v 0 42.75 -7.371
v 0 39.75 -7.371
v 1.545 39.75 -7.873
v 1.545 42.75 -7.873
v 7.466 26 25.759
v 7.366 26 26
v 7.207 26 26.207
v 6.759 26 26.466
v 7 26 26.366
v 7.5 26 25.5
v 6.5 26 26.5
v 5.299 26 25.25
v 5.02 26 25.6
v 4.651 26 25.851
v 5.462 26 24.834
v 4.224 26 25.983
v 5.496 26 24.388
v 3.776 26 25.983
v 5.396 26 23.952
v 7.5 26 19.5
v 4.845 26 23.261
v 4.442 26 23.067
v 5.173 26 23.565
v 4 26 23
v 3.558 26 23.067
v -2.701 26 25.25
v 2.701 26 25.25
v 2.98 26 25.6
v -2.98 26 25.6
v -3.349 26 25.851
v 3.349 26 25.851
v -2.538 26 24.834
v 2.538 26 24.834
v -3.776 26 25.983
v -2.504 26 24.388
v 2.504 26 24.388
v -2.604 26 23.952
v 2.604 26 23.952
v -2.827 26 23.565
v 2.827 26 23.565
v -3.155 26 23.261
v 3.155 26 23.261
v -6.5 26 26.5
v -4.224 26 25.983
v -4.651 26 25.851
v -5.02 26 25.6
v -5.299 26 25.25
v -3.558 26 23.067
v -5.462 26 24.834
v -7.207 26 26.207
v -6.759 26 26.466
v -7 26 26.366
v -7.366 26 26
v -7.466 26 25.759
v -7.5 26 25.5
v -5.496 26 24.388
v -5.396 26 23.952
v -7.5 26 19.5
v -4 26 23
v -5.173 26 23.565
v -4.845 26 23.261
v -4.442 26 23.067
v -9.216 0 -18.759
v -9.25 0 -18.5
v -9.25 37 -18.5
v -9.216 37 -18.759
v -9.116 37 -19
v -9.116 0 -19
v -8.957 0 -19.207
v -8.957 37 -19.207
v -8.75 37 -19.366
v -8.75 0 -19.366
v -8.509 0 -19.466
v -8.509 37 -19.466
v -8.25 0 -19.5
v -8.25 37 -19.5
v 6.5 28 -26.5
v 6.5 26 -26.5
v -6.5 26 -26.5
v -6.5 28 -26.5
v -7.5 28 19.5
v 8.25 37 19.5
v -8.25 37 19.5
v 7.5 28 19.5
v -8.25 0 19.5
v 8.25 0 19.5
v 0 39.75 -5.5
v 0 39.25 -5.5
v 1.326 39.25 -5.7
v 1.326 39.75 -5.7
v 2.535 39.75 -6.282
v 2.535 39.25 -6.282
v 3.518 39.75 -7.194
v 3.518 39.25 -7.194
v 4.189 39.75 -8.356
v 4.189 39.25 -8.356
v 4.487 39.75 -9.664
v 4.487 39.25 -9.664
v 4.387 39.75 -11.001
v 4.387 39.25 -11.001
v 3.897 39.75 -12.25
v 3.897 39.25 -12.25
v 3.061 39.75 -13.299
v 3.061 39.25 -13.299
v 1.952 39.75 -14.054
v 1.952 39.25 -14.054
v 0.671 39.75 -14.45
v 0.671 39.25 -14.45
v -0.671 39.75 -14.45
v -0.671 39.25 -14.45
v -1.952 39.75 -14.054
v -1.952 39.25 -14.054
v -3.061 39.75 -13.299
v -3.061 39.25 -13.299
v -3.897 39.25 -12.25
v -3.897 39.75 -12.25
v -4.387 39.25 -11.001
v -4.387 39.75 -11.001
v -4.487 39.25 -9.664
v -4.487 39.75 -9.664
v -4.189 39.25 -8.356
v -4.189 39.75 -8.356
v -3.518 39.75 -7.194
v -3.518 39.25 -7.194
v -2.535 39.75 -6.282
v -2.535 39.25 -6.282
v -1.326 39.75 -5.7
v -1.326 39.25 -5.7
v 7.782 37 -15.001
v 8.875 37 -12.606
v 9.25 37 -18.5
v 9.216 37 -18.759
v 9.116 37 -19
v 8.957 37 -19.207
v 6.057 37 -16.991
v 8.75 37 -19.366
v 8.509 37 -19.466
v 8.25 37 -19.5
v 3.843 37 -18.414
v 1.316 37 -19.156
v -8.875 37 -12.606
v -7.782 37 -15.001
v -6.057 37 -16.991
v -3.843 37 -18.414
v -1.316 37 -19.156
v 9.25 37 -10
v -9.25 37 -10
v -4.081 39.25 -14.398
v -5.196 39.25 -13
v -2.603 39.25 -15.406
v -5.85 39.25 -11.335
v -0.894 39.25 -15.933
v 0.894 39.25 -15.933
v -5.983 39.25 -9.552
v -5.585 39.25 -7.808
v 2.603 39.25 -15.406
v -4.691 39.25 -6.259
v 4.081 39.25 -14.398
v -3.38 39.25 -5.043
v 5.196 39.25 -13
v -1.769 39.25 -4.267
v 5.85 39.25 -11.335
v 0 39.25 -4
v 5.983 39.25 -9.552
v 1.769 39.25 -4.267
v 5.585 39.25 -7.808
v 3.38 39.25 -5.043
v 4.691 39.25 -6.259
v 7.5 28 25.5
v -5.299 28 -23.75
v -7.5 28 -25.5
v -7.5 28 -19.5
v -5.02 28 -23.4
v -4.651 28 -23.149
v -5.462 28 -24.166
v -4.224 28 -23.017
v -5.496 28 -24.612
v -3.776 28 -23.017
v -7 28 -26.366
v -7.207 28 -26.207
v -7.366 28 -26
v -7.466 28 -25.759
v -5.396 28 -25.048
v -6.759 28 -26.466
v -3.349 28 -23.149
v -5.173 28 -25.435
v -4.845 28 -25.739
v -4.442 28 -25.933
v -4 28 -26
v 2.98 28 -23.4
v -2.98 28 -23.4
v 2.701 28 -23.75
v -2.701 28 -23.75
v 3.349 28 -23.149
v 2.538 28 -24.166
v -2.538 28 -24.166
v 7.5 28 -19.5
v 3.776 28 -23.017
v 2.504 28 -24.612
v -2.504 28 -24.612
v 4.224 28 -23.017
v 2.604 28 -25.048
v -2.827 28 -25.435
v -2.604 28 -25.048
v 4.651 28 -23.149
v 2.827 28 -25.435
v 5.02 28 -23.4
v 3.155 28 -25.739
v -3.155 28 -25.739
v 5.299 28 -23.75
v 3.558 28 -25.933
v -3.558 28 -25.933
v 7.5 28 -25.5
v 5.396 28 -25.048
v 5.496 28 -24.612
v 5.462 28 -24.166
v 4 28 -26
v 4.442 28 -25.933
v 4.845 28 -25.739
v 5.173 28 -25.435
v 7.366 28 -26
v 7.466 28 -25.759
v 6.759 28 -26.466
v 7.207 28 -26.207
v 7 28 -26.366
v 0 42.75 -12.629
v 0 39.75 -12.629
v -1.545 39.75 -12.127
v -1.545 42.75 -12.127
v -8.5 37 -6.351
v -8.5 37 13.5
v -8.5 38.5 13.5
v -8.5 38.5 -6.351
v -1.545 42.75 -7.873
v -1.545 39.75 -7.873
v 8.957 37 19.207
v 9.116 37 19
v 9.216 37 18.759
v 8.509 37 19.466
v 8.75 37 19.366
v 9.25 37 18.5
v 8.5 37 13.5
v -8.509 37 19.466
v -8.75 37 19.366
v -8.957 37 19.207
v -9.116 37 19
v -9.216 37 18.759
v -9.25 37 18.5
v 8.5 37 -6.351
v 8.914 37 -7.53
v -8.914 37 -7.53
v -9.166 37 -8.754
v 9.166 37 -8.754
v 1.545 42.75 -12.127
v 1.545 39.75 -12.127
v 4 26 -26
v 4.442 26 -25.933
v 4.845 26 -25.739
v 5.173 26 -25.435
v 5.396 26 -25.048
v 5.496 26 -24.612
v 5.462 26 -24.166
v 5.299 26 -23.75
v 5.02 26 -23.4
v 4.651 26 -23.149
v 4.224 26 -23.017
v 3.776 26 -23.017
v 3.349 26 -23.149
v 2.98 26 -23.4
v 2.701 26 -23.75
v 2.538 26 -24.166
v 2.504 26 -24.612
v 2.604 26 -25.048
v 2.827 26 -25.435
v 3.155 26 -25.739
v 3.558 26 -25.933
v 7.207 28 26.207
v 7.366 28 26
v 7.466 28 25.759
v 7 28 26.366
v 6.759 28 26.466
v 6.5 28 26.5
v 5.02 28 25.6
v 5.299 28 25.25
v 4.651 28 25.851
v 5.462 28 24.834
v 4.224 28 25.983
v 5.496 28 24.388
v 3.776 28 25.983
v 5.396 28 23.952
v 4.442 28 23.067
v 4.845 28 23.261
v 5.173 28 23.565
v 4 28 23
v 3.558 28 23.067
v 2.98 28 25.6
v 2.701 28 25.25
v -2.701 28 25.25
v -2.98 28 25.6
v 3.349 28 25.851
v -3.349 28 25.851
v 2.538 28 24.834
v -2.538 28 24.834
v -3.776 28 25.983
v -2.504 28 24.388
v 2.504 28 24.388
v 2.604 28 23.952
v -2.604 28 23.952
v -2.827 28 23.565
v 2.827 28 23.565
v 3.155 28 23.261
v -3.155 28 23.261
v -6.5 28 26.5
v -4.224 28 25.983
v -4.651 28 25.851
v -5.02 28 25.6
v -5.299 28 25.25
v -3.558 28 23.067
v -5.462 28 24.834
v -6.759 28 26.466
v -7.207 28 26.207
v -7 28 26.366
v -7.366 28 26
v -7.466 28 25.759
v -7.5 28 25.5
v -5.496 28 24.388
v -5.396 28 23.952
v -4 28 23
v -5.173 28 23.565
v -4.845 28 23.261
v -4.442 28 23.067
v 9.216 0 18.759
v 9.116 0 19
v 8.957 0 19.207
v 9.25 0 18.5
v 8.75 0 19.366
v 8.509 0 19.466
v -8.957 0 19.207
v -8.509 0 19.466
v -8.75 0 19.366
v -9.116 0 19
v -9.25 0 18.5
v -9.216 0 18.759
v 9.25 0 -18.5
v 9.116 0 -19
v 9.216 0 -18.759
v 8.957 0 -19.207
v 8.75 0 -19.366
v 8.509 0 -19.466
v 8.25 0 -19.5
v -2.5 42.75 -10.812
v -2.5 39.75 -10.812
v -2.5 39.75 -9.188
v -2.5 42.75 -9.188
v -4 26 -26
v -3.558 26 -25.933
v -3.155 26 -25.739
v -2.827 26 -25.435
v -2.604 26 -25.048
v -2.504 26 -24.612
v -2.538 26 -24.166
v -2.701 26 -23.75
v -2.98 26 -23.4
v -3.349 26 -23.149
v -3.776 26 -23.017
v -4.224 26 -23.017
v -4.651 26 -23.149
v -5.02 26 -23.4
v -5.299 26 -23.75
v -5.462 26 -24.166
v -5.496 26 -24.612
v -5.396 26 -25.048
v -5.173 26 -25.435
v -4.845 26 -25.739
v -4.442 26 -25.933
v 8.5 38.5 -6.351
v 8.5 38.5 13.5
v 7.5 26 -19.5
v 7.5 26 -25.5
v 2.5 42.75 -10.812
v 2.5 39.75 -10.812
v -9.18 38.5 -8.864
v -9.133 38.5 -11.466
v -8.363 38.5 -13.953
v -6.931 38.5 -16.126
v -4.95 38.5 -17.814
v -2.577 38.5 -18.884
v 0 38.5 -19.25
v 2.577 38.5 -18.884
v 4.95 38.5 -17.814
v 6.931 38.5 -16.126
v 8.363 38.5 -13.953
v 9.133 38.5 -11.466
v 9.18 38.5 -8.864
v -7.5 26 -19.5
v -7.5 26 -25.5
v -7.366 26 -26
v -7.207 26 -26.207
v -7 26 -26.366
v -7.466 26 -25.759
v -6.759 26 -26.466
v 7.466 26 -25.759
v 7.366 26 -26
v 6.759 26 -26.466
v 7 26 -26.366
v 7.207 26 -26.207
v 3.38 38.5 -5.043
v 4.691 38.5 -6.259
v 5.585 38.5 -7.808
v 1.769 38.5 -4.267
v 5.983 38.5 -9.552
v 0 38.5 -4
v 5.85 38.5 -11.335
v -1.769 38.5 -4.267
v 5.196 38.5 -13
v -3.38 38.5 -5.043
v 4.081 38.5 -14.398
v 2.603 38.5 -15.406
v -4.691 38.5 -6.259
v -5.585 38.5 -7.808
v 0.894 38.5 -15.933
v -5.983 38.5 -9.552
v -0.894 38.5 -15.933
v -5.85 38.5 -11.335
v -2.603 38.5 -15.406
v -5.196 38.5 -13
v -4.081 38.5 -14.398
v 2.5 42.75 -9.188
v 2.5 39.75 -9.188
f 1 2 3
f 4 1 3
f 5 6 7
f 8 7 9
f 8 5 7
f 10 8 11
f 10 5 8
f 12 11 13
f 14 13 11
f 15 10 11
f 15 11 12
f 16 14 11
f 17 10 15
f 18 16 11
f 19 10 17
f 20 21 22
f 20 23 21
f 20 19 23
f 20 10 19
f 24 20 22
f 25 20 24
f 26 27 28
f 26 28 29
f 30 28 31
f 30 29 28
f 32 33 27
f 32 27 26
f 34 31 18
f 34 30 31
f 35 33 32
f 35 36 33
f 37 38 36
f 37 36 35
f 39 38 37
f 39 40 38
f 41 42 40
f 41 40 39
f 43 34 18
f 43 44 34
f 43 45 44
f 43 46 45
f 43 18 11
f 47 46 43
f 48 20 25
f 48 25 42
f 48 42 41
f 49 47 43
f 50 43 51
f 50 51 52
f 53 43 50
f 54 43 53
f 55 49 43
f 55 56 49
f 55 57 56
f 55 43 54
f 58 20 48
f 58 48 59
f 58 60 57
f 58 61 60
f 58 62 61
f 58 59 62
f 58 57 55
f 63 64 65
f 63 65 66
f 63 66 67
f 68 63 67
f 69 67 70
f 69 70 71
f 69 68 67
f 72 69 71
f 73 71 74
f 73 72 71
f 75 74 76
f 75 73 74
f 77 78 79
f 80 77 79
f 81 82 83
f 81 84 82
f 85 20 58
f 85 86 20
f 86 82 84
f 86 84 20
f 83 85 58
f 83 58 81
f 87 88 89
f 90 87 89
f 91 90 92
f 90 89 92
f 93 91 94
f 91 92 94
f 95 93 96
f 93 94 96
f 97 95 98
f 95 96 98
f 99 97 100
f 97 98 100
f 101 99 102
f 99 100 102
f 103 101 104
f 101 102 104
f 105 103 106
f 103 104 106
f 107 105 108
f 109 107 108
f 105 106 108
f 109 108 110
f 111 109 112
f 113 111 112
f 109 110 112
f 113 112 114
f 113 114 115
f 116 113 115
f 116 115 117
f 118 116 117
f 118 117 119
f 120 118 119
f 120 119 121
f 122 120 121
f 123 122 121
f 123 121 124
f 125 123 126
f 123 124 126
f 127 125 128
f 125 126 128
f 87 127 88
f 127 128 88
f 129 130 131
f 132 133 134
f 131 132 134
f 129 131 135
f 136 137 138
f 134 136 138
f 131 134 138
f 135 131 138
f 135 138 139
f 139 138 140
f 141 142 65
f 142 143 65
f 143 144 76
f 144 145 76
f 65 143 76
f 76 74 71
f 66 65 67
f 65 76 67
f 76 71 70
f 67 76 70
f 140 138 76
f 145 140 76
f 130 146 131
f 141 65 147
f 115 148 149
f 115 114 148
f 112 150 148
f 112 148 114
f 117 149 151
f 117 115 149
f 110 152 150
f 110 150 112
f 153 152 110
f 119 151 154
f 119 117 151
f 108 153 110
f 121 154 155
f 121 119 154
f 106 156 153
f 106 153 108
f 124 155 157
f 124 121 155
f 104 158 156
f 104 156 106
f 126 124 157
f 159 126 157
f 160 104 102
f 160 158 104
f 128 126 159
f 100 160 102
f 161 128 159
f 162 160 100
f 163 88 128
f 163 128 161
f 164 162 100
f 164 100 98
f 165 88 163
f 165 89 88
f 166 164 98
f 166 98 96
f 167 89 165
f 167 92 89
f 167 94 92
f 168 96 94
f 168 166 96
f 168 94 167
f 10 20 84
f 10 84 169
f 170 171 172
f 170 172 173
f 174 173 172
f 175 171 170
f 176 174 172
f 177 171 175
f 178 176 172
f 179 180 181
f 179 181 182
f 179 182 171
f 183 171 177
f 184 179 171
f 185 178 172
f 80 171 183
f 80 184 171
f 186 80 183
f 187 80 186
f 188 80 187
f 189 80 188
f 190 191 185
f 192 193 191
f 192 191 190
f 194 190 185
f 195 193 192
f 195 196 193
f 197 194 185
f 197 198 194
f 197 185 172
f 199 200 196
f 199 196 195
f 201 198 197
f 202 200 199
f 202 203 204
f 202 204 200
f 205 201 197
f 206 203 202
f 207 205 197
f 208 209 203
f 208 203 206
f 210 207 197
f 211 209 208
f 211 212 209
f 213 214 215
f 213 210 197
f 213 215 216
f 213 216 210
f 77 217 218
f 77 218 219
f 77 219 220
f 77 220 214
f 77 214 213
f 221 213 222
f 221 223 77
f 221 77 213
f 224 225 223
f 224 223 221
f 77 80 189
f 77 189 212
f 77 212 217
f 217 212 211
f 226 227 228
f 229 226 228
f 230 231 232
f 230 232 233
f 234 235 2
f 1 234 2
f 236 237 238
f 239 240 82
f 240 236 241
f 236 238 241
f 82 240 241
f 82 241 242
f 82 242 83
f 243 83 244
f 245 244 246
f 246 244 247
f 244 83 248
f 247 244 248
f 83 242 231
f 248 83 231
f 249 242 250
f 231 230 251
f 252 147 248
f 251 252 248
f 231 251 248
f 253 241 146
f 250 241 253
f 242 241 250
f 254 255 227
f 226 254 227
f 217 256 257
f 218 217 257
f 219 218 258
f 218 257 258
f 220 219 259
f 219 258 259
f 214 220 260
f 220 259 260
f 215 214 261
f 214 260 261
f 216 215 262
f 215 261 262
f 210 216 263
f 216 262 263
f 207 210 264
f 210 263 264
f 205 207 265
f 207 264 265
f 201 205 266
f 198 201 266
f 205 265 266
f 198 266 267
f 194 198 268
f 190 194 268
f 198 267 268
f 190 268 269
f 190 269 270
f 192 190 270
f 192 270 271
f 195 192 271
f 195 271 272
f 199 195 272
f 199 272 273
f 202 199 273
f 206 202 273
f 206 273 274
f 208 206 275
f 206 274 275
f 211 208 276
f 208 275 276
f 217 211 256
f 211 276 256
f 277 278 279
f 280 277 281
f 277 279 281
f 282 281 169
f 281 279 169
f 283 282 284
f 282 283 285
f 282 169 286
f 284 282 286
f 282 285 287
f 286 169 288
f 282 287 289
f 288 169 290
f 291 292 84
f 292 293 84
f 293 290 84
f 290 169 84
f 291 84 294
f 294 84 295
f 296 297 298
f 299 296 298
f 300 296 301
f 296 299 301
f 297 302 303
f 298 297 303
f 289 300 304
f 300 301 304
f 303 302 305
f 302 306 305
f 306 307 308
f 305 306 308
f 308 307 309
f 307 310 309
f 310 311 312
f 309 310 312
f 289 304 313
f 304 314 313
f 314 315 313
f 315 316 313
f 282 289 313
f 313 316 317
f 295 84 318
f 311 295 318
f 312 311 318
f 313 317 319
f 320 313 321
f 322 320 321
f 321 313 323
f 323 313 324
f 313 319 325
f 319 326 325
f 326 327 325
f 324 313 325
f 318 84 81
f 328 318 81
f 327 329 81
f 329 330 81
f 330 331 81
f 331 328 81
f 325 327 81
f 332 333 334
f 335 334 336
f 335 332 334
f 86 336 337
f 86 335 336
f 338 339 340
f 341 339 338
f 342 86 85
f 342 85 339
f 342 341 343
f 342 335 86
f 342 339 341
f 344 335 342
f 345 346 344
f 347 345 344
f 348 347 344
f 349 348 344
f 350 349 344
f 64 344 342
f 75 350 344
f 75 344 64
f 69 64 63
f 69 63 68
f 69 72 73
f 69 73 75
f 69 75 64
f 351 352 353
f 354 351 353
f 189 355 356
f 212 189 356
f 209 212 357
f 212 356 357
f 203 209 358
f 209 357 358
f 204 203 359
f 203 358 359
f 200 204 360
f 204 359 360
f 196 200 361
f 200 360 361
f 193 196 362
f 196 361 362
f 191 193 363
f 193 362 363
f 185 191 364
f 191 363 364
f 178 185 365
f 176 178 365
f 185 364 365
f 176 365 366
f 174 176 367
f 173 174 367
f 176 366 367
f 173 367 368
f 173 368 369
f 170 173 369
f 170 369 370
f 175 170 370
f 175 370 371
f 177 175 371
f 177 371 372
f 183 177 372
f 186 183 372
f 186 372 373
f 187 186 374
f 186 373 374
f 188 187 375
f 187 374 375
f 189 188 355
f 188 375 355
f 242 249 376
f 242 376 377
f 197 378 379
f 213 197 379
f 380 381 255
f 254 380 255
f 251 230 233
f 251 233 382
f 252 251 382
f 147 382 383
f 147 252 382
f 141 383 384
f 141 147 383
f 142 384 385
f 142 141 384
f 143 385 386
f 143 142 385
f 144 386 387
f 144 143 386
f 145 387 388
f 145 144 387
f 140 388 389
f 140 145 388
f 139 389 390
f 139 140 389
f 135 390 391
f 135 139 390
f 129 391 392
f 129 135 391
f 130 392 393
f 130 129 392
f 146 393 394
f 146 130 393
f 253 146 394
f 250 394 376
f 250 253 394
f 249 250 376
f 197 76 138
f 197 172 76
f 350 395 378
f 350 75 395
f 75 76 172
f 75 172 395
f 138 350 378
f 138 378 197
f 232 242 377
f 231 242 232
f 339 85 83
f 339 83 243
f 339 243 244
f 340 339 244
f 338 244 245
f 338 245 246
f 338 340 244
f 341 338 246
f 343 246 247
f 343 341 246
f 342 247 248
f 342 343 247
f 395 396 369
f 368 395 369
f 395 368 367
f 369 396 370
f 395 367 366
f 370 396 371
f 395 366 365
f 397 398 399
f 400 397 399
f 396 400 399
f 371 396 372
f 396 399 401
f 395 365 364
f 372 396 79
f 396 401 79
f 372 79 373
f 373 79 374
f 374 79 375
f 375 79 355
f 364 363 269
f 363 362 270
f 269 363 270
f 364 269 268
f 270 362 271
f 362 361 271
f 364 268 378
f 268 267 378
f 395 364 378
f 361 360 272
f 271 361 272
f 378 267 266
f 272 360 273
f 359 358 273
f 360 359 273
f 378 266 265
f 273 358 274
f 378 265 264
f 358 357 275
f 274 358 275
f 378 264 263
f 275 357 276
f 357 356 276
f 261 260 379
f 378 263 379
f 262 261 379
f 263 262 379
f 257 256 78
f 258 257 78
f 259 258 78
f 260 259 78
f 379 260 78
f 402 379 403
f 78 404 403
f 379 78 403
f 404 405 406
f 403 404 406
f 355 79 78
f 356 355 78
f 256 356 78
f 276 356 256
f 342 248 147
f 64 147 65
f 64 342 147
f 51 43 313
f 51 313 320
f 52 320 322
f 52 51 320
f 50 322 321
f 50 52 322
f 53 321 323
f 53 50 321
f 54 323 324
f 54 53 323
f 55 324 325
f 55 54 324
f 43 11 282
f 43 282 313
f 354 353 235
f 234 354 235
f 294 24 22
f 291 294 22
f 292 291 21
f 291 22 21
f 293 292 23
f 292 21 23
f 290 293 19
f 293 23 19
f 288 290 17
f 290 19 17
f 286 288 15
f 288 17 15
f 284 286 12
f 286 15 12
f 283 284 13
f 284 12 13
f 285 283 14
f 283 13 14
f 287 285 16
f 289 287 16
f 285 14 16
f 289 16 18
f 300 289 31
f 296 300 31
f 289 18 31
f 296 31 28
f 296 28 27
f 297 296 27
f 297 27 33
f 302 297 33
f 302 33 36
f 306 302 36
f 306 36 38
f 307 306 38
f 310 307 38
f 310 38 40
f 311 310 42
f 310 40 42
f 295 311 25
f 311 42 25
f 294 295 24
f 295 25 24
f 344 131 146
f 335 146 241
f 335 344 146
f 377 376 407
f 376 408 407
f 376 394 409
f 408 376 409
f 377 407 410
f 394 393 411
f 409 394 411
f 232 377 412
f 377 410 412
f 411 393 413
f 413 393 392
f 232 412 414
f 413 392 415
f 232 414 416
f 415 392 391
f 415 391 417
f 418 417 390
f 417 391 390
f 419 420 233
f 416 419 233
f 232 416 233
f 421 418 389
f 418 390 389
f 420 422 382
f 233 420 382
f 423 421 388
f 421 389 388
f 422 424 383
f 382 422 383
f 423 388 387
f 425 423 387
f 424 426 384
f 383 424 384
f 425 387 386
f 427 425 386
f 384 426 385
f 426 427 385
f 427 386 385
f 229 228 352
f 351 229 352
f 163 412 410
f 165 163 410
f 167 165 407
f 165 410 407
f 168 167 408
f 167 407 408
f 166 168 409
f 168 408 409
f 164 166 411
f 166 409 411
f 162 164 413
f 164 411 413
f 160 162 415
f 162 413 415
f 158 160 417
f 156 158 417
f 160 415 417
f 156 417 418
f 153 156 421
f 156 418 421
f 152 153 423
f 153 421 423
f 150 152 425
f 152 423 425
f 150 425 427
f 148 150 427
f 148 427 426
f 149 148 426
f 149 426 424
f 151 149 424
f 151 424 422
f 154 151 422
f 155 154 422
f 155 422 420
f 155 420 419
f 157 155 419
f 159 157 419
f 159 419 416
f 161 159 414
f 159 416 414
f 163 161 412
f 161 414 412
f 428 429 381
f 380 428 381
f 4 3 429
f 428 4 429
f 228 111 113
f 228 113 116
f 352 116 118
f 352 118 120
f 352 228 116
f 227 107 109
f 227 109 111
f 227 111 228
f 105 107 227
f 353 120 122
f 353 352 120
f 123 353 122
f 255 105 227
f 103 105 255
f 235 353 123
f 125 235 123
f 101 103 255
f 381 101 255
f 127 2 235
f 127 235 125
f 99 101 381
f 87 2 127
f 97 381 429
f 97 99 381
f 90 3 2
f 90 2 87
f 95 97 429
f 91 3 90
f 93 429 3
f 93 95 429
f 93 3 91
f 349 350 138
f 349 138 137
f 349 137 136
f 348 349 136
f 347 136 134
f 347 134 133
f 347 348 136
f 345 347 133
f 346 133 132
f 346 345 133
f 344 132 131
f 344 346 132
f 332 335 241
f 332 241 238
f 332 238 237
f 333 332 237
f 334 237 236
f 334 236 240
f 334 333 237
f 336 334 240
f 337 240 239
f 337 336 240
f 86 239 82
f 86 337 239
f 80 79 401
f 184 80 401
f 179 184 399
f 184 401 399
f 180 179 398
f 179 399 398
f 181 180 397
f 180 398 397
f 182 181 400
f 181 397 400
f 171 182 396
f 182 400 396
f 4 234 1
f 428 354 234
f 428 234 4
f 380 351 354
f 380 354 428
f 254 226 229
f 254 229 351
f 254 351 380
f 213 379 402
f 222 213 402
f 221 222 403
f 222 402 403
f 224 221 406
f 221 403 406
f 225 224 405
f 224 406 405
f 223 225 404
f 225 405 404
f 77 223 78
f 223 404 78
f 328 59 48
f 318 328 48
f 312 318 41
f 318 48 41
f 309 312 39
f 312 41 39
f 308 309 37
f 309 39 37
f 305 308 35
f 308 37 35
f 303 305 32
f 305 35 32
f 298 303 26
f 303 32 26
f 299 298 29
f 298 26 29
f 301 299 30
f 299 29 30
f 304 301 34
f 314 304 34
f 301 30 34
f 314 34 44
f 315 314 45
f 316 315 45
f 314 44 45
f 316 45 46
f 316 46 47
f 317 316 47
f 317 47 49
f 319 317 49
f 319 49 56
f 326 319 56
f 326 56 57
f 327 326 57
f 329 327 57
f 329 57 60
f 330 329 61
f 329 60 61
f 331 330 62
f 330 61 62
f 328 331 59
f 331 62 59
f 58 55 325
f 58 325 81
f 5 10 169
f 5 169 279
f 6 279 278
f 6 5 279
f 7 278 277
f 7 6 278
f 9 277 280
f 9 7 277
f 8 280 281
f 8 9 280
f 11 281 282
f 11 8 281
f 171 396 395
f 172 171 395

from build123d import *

# Parameters (mm, degrees)
BOSS_EXTRUDE1_DEPTH = 37
BOSS_EXTRUDE2_DEPTH = 1.5
SKETCH4_R           = 6
BOSS_EXTRUDE3_DEPTH = 0.75
SKETCH5_R           = 4.5
BOSS_EXTRUDE4_DEPTH = 0.5
BOSS_EXTRUDE5_DEPTH = 3
SKETCH8_R           = 1.5
BOSS_EXTRUDE6_DEPTH = 2


with BuildPart() as part:
    # Sketch1 → Boss-Extrude1 (new body)
    with BuildSketch(Plane(origin=(0, 0, 0), x_dir=(1, 0, 0), z_dir=(0, 1, 0))):
        with BuildLine():
            Line((-8.25, 19.5), (8.25, 19.5))
            ThreePointArc((8.25, 19.5), (8.957106781, 19.207106781), (9.25, 18.5))
            Line((9.25, 18.5), (9.25, -18.5))
            ThreePointArc((9.25, -18.5), (8.957106781, -19.207106781), (8.25, -19.5))
            Line((8.25, -19.5), (-8.25, -19.5))
            ThreePointArc((-8.25, -19.5), (-8.957106781, -19.207106781), (-9.25, -18.5))
            Line((-9.25, -18.5), (-9.25, 18.5))
            ThreePointArc((-9.25, 18.5), (-8.957106781, 19.207106781), (-8.25, 19.5))
        make_face()
    extrude(amount=BOSS_EXTRUDE1_DEPTH)

    # Sketch3 → Boss-Extrude2 (add)
    with BuildSketch(Plane(origin=(0, 37, 0), x_dir=(1, 0, 0), z_dir=(0, 1, 0))):
        with BuildLine():
            Line((8.5, -13.5), (-8.5, -13.5))
            Line((-8.5, -13.5), (-8.5, 6.35137012))
            ThreePointArc((-8.5, 6.35137012), (0, 19.25), (8.5, 6.35137012))
            Line((8.5, 6.35137012), (8.5, -13.5))
        make_face()
    extrude(amount=BOSS_EXTRUDE2_DEPTH)

    # Sketch4 → Boss-Extrude3 (add)
    with BuildSketch(Plane(origin=(0, 38.5, 0), x_dir=(1, 0, 0), z_dir=(0, 1, 0))):
        with Locations(Location((0, 10, 0), (0, 0, 270))):
            Circle(SKETCH4_R)
    extrude(amount=BOSS_EXTRUDE3_DEPTH)

    # Sketch5 → Boss-Extrude4 (add)
    with BuildSketch(Plane(origin=(0, 39.25, 0), x_dir=(1, 0, 0), z_dir=(0, 1, 0))):
        with Locations(Location((0, 10, 0), (0, 0, 270))):
            Circle(SKETCH5_R)
    extrude(amount=BOSS_EXTRUDE4_DEPTH)

    # Sketch6 → Boss-Extrude5 (add)
    with BuildSketch(Plane(origin=(0, 39.75, 0), x_dir=(1, 0, 0), z_dir=(0, 1, 0))):
        Polygon((-2.5, 9.187700759), (-1.545084972, 7.873372979), (0, 7.371344439), (1.545084972, 7.873372979), (2.5, 9.187700759), (2.5, 10.812299241), (1.545084972, 12.126627021), (0, 12.628655561), (-1.545084972, 12.126627021), (-2.5, 10.812299241), align=None)
    extrude(amount=BOSS_EXTRUDE5_DEPTH)

    # Sketch8 → Boss-Extrude6 (add)
    # profile 1 of 2: a face of its own
    with BuildSketch(Plane(origin=(0, 26, 0), x_dir=(-1, 0, 0), z_dir=(0, -1, 0))):
        with BuildLine():
            ThreePointArc((-7.5, 25.5), (-7.207106781, 26.207106781), (-6.5, 26.5))
            Line((-6.5, 26.5), (6.5, 26.5))
            ThreePointArc((6.5, 26.5), (7.207106781, 26.207106781), (7.5, 25.5))
            Line((7.5, 25.5), (7.5, 19.5))
            Line((7.5, 19.5), (-7.5, 19.5))
            Line((-7.5, 19.5), (-7.5, 25.5))
        make_face()
        with Locations(Location((4, 24.5, 0), (0, 0, 90))):
            Circle(SKETCH8_R, mode=Mode.SUBTRACT)
        with Locations(Location((-4, 24.5, 0), (0, 0, 90))):
            Circle(SKETCH8_R, mode=Mode.SUBTRACT)
    # profile 2 of 2: a face of its own
    with BuildSketch(Plane(origin=(0, 26, 0), x_dir=(-1, 0, 0), z_dir=(0, -1, 0))):
        with BuildLine():
            Line((-7.5, -19.5), (-7.5, -25.5))
            ThreePointArc((-7.5, -25.5), (-7.207106781, -26.207106781), (-6.5, -26.5))
            Line((-6.5, -26.5), (6.5, -26.5))
            ThreePointArc((6.5, -26.5), (7.207106781, -26.207106781), (7.5, -25.5))
            Line((7.5, -25.5), (7.5, -19.5))
            Line((7.5, -19.5), (-7.5, -19.5))
        make_face()
        with Locations(Location((-4, -24.5, 0), (0, 0, 90))):
            Circle(SKETCH8_R, mode=Mode.SUBTRACT)
        with Locations(Location((4, -24.5, 0), (0, 0, 90))):
            Circle(SKETCH8_R, mode=Mode.SUBTRACT)
    extrude(amount=-BOSS_EXTRUDE6_DEPTH)


solid = part.part
